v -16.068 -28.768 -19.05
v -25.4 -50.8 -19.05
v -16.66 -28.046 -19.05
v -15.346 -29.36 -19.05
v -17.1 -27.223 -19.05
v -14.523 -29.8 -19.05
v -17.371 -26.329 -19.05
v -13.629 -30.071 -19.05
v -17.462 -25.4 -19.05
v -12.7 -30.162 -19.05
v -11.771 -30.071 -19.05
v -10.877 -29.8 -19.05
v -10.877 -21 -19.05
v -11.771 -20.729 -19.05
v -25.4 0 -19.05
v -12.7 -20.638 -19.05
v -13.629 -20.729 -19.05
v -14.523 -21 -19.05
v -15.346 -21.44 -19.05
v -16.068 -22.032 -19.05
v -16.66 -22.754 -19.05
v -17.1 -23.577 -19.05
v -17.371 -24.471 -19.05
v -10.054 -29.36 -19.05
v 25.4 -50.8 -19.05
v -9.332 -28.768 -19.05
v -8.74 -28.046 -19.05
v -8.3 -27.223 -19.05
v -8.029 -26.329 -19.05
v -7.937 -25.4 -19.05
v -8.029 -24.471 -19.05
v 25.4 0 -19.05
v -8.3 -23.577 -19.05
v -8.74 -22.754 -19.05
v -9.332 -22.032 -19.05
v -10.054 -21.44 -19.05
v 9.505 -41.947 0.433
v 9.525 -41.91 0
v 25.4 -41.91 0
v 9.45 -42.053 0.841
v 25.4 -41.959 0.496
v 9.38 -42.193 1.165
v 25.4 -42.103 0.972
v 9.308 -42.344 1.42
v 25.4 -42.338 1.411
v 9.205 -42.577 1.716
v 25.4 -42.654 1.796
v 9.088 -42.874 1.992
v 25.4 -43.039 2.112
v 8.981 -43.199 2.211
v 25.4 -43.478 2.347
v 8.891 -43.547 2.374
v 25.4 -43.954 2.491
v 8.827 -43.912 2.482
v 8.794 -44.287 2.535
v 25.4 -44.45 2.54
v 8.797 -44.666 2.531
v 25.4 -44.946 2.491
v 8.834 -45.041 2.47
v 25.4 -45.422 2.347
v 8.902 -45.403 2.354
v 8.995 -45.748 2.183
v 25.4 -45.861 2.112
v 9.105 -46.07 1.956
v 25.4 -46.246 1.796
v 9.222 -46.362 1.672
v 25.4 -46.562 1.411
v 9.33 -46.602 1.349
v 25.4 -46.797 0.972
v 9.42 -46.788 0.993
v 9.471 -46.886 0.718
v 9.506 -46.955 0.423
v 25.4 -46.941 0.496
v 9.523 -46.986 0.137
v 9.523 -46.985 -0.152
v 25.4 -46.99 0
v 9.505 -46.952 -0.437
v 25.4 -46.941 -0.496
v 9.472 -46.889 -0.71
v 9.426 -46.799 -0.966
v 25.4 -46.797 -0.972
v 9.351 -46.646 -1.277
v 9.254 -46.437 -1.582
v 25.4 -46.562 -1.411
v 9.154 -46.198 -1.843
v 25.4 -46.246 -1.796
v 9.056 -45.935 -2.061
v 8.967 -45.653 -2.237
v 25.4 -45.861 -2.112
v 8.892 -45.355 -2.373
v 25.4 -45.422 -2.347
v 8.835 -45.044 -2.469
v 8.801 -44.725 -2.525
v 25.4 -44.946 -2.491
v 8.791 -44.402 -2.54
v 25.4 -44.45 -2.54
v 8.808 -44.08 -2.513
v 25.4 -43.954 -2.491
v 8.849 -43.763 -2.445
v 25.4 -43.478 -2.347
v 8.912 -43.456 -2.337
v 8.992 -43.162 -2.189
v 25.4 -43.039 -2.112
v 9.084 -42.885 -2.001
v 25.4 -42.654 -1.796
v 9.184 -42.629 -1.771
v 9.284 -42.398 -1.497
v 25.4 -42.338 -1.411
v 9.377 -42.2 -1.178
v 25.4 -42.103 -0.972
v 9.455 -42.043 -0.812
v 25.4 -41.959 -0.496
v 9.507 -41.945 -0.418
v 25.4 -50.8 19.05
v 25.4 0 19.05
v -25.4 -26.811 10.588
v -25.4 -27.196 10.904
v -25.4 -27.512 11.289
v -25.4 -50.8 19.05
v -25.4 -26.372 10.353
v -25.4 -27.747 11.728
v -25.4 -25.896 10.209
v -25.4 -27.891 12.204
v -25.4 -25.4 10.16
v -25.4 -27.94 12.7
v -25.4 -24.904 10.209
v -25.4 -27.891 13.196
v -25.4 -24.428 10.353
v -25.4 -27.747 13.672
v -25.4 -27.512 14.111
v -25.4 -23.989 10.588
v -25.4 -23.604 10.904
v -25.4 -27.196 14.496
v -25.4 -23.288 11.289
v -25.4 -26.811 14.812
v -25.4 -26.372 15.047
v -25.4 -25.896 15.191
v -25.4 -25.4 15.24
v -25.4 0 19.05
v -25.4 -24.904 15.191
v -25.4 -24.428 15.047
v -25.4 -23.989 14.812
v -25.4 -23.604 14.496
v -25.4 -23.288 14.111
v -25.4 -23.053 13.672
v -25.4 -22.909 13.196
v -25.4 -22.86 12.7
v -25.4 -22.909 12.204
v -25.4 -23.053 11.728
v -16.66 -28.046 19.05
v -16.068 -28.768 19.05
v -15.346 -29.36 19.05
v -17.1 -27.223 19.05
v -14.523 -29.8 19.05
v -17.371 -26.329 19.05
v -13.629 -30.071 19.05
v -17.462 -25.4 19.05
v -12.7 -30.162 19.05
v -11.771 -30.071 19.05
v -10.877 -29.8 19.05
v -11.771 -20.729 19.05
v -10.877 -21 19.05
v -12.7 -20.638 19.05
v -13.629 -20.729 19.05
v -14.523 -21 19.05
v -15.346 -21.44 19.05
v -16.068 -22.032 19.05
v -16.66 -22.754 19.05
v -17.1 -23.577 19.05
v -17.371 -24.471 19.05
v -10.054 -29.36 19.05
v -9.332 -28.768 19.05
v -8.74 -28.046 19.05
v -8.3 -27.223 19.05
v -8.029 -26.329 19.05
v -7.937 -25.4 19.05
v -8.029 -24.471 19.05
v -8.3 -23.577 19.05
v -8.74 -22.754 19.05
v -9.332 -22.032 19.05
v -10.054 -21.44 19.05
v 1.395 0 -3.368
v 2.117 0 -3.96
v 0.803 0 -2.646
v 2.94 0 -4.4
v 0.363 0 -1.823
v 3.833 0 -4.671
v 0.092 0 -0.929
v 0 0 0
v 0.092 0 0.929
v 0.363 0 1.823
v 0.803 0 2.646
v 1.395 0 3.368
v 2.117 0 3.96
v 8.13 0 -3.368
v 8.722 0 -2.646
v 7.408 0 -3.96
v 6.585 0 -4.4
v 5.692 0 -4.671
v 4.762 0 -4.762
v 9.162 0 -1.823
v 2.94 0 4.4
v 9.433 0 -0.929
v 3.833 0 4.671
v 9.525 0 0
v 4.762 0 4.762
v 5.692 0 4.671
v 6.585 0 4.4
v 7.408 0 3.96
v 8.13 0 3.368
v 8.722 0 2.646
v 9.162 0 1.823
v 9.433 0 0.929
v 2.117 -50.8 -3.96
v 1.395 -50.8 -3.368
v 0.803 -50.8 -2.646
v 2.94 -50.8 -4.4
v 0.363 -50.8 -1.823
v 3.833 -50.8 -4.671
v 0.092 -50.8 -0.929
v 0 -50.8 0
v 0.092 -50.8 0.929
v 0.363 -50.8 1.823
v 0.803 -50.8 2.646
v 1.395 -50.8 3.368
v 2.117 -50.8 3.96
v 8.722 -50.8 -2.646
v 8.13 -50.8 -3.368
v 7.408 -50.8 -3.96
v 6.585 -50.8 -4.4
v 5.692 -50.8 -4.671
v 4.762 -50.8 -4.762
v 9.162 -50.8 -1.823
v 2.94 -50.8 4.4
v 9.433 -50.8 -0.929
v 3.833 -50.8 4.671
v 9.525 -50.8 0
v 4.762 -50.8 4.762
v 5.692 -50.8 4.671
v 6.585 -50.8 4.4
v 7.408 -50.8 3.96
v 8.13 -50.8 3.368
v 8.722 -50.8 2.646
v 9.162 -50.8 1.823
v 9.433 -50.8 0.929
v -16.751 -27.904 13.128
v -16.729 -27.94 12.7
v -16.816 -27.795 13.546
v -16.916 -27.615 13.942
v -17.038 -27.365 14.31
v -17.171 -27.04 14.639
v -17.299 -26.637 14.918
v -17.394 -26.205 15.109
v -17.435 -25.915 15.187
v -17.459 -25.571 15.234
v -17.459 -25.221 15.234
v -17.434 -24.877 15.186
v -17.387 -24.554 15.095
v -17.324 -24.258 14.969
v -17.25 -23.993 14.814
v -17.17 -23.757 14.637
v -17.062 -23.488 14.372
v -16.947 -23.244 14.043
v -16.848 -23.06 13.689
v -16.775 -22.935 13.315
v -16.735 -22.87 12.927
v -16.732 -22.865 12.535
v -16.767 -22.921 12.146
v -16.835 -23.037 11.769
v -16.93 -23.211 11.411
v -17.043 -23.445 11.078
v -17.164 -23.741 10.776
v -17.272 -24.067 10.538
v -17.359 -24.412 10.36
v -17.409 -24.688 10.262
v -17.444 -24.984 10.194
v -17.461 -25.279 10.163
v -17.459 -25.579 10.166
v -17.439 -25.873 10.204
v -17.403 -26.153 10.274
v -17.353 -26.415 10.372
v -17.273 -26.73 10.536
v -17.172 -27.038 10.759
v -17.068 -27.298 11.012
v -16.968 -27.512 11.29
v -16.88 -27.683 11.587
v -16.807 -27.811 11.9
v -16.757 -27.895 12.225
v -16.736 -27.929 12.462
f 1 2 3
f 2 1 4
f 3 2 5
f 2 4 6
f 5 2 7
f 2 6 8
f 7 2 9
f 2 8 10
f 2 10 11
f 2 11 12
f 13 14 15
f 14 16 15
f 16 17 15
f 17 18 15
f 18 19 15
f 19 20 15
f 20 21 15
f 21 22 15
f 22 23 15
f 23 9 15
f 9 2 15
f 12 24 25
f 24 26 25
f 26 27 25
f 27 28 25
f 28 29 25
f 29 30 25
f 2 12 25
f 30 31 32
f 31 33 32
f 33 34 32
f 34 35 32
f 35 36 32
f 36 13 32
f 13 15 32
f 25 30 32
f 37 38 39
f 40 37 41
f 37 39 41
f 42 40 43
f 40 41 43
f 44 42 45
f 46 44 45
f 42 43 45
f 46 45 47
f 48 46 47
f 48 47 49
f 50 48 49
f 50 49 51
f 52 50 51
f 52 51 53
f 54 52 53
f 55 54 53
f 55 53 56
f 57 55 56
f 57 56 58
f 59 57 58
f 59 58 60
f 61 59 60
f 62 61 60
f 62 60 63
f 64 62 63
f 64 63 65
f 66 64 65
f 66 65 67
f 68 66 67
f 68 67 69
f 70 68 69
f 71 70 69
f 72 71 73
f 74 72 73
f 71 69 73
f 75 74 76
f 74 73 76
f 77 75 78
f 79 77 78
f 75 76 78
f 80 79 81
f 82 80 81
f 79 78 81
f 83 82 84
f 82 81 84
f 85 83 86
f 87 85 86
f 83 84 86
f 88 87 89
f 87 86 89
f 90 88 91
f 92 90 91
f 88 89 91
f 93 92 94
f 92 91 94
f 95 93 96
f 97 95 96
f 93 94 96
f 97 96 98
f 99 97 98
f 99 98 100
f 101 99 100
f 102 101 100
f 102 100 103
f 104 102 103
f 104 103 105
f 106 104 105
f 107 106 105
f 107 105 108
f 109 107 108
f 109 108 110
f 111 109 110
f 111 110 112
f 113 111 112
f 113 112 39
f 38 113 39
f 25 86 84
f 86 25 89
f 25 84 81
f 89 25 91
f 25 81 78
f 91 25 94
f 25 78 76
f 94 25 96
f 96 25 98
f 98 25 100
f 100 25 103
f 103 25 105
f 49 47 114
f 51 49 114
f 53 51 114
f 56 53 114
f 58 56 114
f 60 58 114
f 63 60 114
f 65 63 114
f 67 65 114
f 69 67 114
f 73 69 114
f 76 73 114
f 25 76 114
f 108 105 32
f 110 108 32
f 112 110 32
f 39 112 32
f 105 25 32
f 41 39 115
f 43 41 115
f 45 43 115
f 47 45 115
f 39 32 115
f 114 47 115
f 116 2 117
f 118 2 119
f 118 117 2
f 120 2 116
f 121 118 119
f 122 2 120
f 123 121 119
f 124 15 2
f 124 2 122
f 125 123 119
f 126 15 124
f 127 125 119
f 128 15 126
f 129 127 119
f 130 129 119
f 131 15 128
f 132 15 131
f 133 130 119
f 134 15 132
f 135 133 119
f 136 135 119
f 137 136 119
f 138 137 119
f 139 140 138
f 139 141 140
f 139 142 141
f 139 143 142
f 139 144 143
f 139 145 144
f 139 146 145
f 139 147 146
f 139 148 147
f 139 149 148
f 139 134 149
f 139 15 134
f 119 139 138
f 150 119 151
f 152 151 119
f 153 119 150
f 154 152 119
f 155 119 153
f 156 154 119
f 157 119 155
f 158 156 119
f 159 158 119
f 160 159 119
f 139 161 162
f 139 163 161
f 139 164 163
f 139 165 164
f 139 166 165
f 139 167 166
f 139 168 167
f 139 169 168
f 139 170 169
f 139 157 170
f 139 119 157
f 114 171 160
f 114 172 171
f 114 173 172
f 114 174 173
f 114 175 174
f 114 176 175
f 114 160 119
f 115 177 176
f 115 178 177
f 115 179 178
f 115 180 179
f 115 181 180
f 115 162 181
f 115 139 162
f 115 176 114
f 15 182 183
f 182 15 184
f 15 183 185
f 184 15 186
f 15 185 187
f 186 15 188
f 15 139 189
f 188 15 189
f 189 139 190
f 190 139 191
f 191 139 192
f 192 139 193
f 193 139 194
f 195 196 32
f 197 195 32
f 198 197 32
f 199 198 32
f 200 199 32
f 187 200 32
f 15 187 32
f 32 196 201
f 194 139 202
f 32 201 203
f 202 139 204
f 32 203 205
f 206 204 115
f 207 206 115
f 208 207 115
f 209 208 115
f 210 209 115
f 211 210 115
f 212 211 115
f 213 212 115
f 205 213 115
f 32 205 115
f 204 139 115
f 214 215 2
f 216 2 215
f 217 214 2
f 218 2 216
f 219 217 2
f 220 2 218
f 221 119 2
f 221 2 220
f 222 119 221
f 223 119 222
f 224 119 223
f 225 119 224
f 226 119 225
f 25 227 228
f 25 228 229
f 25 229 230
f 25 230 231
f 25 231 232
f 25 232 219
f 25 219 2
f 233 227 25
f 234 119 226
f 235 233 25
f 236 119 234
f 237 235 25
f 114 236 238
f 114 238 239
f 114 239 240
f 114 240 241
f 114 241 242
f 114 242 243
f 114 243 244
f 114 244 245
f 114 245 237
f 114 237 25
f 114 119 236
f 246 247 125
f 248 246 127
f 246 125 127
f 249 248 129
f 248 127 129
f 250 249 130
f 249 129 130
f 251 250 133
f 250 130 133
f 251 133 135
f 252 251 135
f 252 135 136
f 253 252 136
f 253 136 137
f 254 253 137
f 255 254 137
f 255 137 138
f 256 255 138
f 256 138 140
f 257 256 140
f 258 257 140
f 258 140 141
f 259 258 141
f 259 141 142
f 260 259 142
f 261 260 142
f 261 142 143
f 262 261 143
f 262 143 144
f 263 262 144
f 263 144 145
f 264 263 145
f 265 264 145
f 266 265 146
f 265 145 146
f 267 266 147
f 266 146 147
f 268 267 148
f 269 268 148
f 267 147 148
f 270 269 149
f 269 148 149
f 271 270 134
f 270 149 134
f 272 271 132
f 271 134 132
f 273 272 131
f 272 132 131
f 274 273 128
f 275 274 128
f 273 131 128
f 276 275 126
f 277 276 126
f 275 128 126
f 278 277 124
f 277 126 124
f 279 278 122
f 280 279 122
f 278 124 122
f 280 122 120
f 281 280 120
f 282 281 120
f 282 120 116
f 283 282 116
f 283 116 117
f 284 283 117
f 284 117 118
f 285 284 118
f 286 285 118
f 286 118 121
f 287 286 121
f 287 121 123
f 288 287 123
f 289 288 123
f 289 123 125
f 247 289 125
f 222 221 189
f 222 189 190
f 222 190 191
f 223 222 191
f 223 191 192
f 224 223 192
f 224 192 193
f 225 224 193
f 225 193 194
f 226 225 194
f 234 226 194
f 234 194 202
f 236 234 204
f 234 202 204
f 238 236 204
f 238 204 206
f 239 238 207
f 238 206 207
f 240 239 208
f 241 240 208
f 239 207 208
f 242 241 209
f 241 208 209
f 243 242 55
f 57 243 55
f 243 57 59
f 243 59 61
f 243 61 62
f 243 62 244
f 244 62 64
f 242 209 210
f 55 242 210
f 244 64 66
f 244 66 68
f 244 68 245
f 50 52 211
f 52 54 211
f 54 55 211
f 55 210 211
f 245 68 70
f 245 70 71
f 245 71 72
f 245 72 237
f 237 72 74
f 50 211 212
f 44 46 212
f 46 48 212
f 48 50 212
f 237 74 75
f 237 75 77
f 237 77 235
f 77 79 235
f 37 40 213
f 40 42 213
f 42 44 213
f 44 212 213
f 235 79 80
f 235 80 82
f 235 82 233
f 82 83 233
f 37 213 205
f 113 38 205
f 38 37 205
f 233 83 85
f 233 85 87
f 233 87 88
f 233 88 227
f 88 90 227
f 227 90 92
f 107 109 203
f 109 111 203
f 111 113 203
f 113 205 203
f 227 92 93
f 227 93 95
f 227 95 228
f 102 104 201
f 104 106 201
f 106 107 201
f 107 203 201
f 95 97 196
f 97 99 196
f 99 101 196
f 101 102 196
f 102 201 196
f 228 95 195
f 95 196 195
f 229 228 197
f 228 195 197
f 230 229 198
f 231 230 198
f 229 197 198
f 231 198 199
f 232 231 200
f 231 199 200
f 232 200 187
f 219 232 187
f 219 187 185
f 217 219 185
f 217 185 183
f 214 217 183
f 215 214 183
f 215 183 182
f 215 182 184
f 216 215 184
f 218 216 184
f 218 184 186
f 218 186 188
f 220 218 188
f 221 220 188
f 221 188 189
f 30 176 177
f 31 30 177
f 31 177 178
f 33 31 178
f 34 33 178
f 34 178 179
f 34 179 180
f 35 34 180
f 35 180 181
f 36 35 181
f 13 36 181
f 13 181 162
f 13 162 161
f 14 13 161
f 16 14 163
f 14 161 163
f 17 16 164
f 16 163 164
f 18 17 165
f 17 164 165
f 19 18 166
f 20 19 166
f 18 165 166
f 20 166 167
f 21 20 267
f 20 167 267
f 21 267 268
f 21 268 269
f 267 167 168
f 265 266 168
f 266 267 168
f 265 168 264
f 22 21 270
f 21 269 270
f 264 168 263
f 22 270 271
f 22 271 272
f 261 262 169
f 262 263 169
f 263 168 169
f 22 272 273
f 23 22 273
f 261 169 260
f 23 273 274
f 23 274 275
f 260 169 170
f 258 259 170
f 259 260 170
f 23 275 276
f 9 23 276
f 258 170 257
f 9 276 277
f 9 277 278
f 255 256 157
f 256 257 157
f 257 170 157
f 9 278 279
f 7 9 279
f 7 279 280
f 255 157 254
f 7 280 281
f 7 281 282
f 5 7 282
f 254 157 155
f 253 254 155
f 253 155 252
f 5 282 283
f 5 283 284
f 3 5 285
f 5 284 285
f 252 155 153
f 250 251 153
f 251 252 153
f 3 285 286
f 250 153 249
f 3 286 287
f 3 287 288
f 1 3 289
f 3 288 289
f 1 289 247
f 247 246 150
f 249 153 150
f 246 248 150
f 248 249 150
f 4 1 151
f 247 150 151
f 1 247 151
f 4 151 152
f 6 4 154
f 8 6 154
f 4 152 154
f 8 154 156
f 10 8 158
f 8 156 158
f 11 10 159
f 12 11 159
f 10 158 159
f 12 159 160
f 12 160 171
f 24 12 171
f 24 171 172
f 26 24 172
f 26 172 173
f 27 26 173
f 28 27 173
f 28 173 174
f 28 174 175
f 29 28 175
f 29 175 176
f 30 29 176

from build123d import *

# Parameters (mm, degrees)
F0_W     = 50.8
F0_H     = 38.1
F1_DEPTH = 50.8
F2_R     = 4.7625
F3_DEPTH = 50.801
F4_R     = 4.7625
F5_DEPTH = 38.101
F6_R     = 2.54
F7_DEPTH = 12.7
F8_R     = 2.54
F9_DEPTH = 19.05


with BuildPart() as f1:
    # F0 (on Front) → F1 (new body)
    with BuildSketch(Plane.XZ):
        Rectangle(F0_W, F0_H)
    extrude(amount=F1_DEPTH)

    # F2 (on face) → F3 (cut, through all)
    with BuildSketch(Plane(origin=(0, 0, 0), x_dir=(-1, 0, 0), z_dir=(0, 1, 0))):
        with Locations((-4.7625, 0)):
            Circle(F2_R)
    extrude(amount=-F3_DEPTH, mode=Mode.SUBTRACT)

    # F4 (on face) → F5 (cut, through all)
    with BuildSketch(Plane.XY.offset(19.05)):
        with Locations((-12.7, -25.4)):
            Circle(F4_R)
    extrude(amount=-F5_DEPTH, mode=Mode.SUBTRACT)

    # F6 (on face) → F7 (cut)
    with BuildSketch(Plane(origin=(-25.4, 0, 0), x_dir=(0, -1, 0), z_dir=(-1, 0, 0))):
        with Locations((25.4, 12.7)):
            Circle(F6_R)
    extrude(amount=-F7_DEPTH, mode=Mode.SUBTRACT)

    # F8 (on face) → F9 (cut)
    with BuildSketch(Plane.YZ.offset(25.4)):
        with Locations((-44.45, 0)):
            Circle(F8_R)
    extrude(amount=-F9_DEPTH, mode=Mode.SUBTRACT)


solid = f1.part
